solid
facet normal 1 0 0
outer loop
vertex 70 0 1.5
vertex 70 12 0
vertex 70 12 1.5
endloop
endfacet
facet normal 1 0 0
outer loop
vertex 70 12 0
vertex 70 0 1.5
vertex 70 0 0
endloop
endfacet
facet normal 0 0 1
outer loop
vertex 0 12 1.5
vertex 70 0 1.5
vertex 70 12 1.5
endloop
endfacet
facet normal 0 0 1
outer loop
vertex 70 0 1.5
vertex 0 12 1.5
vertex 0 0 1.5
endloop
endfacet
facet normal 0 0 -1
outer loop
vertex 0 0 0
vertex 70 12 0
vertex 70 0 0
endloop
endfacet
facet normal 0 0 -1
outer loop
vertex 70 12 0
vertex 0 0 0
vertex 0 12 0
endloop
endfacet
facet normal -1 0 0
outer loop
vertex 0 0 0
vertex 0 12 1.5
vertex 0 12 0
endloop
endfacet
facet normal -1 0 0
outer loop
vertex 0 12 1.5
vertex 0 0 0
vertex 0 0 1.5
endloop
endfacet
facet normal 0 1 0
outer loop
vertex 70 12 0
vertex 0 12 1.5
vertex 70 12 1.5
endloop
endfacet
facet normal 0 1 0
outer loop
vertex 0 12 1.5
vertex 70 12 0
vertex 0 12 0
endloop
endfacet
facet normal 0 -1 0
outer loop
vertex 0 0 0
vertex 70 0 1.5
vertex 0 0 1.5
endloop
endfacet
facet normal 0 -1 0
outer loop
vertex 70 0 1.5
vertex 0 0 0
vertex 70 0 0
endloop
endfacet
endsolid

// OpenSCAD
// Agarose gel comb - a flat plate with a back bar and a row of rectangular teeth for casting
// horizontal gels. NOVEL general part, printed lying flat on the bed.
//

teeth = 10;
bar   = 70;
t     = 1.5;
w     = 12;
d     = 5;
g     = 1.5;

$fn = 48;

tooth_w = d;
space   = g;

difference() {
    union() {
        cube([bar, w, t]);                                     // back bar
        for (i = [0 : teeth - 1])
            translate([-(teeth * tooth_w + (teeth - 1) * space) / 2 - i * (tooth_w + space), w / 2, 0])
                cube([tooth_w, w, t]);                         // teeth
    }
    for (i = [0 : teeth - 1])
        translate([-(teeth * tooth_w + (teeth - 1) * space) / 2 - i * (tooth_w + space), w / 2, 0])
            cube([tooth_w, w, t + 1]);                         // cut through the tips of the teeth
}
